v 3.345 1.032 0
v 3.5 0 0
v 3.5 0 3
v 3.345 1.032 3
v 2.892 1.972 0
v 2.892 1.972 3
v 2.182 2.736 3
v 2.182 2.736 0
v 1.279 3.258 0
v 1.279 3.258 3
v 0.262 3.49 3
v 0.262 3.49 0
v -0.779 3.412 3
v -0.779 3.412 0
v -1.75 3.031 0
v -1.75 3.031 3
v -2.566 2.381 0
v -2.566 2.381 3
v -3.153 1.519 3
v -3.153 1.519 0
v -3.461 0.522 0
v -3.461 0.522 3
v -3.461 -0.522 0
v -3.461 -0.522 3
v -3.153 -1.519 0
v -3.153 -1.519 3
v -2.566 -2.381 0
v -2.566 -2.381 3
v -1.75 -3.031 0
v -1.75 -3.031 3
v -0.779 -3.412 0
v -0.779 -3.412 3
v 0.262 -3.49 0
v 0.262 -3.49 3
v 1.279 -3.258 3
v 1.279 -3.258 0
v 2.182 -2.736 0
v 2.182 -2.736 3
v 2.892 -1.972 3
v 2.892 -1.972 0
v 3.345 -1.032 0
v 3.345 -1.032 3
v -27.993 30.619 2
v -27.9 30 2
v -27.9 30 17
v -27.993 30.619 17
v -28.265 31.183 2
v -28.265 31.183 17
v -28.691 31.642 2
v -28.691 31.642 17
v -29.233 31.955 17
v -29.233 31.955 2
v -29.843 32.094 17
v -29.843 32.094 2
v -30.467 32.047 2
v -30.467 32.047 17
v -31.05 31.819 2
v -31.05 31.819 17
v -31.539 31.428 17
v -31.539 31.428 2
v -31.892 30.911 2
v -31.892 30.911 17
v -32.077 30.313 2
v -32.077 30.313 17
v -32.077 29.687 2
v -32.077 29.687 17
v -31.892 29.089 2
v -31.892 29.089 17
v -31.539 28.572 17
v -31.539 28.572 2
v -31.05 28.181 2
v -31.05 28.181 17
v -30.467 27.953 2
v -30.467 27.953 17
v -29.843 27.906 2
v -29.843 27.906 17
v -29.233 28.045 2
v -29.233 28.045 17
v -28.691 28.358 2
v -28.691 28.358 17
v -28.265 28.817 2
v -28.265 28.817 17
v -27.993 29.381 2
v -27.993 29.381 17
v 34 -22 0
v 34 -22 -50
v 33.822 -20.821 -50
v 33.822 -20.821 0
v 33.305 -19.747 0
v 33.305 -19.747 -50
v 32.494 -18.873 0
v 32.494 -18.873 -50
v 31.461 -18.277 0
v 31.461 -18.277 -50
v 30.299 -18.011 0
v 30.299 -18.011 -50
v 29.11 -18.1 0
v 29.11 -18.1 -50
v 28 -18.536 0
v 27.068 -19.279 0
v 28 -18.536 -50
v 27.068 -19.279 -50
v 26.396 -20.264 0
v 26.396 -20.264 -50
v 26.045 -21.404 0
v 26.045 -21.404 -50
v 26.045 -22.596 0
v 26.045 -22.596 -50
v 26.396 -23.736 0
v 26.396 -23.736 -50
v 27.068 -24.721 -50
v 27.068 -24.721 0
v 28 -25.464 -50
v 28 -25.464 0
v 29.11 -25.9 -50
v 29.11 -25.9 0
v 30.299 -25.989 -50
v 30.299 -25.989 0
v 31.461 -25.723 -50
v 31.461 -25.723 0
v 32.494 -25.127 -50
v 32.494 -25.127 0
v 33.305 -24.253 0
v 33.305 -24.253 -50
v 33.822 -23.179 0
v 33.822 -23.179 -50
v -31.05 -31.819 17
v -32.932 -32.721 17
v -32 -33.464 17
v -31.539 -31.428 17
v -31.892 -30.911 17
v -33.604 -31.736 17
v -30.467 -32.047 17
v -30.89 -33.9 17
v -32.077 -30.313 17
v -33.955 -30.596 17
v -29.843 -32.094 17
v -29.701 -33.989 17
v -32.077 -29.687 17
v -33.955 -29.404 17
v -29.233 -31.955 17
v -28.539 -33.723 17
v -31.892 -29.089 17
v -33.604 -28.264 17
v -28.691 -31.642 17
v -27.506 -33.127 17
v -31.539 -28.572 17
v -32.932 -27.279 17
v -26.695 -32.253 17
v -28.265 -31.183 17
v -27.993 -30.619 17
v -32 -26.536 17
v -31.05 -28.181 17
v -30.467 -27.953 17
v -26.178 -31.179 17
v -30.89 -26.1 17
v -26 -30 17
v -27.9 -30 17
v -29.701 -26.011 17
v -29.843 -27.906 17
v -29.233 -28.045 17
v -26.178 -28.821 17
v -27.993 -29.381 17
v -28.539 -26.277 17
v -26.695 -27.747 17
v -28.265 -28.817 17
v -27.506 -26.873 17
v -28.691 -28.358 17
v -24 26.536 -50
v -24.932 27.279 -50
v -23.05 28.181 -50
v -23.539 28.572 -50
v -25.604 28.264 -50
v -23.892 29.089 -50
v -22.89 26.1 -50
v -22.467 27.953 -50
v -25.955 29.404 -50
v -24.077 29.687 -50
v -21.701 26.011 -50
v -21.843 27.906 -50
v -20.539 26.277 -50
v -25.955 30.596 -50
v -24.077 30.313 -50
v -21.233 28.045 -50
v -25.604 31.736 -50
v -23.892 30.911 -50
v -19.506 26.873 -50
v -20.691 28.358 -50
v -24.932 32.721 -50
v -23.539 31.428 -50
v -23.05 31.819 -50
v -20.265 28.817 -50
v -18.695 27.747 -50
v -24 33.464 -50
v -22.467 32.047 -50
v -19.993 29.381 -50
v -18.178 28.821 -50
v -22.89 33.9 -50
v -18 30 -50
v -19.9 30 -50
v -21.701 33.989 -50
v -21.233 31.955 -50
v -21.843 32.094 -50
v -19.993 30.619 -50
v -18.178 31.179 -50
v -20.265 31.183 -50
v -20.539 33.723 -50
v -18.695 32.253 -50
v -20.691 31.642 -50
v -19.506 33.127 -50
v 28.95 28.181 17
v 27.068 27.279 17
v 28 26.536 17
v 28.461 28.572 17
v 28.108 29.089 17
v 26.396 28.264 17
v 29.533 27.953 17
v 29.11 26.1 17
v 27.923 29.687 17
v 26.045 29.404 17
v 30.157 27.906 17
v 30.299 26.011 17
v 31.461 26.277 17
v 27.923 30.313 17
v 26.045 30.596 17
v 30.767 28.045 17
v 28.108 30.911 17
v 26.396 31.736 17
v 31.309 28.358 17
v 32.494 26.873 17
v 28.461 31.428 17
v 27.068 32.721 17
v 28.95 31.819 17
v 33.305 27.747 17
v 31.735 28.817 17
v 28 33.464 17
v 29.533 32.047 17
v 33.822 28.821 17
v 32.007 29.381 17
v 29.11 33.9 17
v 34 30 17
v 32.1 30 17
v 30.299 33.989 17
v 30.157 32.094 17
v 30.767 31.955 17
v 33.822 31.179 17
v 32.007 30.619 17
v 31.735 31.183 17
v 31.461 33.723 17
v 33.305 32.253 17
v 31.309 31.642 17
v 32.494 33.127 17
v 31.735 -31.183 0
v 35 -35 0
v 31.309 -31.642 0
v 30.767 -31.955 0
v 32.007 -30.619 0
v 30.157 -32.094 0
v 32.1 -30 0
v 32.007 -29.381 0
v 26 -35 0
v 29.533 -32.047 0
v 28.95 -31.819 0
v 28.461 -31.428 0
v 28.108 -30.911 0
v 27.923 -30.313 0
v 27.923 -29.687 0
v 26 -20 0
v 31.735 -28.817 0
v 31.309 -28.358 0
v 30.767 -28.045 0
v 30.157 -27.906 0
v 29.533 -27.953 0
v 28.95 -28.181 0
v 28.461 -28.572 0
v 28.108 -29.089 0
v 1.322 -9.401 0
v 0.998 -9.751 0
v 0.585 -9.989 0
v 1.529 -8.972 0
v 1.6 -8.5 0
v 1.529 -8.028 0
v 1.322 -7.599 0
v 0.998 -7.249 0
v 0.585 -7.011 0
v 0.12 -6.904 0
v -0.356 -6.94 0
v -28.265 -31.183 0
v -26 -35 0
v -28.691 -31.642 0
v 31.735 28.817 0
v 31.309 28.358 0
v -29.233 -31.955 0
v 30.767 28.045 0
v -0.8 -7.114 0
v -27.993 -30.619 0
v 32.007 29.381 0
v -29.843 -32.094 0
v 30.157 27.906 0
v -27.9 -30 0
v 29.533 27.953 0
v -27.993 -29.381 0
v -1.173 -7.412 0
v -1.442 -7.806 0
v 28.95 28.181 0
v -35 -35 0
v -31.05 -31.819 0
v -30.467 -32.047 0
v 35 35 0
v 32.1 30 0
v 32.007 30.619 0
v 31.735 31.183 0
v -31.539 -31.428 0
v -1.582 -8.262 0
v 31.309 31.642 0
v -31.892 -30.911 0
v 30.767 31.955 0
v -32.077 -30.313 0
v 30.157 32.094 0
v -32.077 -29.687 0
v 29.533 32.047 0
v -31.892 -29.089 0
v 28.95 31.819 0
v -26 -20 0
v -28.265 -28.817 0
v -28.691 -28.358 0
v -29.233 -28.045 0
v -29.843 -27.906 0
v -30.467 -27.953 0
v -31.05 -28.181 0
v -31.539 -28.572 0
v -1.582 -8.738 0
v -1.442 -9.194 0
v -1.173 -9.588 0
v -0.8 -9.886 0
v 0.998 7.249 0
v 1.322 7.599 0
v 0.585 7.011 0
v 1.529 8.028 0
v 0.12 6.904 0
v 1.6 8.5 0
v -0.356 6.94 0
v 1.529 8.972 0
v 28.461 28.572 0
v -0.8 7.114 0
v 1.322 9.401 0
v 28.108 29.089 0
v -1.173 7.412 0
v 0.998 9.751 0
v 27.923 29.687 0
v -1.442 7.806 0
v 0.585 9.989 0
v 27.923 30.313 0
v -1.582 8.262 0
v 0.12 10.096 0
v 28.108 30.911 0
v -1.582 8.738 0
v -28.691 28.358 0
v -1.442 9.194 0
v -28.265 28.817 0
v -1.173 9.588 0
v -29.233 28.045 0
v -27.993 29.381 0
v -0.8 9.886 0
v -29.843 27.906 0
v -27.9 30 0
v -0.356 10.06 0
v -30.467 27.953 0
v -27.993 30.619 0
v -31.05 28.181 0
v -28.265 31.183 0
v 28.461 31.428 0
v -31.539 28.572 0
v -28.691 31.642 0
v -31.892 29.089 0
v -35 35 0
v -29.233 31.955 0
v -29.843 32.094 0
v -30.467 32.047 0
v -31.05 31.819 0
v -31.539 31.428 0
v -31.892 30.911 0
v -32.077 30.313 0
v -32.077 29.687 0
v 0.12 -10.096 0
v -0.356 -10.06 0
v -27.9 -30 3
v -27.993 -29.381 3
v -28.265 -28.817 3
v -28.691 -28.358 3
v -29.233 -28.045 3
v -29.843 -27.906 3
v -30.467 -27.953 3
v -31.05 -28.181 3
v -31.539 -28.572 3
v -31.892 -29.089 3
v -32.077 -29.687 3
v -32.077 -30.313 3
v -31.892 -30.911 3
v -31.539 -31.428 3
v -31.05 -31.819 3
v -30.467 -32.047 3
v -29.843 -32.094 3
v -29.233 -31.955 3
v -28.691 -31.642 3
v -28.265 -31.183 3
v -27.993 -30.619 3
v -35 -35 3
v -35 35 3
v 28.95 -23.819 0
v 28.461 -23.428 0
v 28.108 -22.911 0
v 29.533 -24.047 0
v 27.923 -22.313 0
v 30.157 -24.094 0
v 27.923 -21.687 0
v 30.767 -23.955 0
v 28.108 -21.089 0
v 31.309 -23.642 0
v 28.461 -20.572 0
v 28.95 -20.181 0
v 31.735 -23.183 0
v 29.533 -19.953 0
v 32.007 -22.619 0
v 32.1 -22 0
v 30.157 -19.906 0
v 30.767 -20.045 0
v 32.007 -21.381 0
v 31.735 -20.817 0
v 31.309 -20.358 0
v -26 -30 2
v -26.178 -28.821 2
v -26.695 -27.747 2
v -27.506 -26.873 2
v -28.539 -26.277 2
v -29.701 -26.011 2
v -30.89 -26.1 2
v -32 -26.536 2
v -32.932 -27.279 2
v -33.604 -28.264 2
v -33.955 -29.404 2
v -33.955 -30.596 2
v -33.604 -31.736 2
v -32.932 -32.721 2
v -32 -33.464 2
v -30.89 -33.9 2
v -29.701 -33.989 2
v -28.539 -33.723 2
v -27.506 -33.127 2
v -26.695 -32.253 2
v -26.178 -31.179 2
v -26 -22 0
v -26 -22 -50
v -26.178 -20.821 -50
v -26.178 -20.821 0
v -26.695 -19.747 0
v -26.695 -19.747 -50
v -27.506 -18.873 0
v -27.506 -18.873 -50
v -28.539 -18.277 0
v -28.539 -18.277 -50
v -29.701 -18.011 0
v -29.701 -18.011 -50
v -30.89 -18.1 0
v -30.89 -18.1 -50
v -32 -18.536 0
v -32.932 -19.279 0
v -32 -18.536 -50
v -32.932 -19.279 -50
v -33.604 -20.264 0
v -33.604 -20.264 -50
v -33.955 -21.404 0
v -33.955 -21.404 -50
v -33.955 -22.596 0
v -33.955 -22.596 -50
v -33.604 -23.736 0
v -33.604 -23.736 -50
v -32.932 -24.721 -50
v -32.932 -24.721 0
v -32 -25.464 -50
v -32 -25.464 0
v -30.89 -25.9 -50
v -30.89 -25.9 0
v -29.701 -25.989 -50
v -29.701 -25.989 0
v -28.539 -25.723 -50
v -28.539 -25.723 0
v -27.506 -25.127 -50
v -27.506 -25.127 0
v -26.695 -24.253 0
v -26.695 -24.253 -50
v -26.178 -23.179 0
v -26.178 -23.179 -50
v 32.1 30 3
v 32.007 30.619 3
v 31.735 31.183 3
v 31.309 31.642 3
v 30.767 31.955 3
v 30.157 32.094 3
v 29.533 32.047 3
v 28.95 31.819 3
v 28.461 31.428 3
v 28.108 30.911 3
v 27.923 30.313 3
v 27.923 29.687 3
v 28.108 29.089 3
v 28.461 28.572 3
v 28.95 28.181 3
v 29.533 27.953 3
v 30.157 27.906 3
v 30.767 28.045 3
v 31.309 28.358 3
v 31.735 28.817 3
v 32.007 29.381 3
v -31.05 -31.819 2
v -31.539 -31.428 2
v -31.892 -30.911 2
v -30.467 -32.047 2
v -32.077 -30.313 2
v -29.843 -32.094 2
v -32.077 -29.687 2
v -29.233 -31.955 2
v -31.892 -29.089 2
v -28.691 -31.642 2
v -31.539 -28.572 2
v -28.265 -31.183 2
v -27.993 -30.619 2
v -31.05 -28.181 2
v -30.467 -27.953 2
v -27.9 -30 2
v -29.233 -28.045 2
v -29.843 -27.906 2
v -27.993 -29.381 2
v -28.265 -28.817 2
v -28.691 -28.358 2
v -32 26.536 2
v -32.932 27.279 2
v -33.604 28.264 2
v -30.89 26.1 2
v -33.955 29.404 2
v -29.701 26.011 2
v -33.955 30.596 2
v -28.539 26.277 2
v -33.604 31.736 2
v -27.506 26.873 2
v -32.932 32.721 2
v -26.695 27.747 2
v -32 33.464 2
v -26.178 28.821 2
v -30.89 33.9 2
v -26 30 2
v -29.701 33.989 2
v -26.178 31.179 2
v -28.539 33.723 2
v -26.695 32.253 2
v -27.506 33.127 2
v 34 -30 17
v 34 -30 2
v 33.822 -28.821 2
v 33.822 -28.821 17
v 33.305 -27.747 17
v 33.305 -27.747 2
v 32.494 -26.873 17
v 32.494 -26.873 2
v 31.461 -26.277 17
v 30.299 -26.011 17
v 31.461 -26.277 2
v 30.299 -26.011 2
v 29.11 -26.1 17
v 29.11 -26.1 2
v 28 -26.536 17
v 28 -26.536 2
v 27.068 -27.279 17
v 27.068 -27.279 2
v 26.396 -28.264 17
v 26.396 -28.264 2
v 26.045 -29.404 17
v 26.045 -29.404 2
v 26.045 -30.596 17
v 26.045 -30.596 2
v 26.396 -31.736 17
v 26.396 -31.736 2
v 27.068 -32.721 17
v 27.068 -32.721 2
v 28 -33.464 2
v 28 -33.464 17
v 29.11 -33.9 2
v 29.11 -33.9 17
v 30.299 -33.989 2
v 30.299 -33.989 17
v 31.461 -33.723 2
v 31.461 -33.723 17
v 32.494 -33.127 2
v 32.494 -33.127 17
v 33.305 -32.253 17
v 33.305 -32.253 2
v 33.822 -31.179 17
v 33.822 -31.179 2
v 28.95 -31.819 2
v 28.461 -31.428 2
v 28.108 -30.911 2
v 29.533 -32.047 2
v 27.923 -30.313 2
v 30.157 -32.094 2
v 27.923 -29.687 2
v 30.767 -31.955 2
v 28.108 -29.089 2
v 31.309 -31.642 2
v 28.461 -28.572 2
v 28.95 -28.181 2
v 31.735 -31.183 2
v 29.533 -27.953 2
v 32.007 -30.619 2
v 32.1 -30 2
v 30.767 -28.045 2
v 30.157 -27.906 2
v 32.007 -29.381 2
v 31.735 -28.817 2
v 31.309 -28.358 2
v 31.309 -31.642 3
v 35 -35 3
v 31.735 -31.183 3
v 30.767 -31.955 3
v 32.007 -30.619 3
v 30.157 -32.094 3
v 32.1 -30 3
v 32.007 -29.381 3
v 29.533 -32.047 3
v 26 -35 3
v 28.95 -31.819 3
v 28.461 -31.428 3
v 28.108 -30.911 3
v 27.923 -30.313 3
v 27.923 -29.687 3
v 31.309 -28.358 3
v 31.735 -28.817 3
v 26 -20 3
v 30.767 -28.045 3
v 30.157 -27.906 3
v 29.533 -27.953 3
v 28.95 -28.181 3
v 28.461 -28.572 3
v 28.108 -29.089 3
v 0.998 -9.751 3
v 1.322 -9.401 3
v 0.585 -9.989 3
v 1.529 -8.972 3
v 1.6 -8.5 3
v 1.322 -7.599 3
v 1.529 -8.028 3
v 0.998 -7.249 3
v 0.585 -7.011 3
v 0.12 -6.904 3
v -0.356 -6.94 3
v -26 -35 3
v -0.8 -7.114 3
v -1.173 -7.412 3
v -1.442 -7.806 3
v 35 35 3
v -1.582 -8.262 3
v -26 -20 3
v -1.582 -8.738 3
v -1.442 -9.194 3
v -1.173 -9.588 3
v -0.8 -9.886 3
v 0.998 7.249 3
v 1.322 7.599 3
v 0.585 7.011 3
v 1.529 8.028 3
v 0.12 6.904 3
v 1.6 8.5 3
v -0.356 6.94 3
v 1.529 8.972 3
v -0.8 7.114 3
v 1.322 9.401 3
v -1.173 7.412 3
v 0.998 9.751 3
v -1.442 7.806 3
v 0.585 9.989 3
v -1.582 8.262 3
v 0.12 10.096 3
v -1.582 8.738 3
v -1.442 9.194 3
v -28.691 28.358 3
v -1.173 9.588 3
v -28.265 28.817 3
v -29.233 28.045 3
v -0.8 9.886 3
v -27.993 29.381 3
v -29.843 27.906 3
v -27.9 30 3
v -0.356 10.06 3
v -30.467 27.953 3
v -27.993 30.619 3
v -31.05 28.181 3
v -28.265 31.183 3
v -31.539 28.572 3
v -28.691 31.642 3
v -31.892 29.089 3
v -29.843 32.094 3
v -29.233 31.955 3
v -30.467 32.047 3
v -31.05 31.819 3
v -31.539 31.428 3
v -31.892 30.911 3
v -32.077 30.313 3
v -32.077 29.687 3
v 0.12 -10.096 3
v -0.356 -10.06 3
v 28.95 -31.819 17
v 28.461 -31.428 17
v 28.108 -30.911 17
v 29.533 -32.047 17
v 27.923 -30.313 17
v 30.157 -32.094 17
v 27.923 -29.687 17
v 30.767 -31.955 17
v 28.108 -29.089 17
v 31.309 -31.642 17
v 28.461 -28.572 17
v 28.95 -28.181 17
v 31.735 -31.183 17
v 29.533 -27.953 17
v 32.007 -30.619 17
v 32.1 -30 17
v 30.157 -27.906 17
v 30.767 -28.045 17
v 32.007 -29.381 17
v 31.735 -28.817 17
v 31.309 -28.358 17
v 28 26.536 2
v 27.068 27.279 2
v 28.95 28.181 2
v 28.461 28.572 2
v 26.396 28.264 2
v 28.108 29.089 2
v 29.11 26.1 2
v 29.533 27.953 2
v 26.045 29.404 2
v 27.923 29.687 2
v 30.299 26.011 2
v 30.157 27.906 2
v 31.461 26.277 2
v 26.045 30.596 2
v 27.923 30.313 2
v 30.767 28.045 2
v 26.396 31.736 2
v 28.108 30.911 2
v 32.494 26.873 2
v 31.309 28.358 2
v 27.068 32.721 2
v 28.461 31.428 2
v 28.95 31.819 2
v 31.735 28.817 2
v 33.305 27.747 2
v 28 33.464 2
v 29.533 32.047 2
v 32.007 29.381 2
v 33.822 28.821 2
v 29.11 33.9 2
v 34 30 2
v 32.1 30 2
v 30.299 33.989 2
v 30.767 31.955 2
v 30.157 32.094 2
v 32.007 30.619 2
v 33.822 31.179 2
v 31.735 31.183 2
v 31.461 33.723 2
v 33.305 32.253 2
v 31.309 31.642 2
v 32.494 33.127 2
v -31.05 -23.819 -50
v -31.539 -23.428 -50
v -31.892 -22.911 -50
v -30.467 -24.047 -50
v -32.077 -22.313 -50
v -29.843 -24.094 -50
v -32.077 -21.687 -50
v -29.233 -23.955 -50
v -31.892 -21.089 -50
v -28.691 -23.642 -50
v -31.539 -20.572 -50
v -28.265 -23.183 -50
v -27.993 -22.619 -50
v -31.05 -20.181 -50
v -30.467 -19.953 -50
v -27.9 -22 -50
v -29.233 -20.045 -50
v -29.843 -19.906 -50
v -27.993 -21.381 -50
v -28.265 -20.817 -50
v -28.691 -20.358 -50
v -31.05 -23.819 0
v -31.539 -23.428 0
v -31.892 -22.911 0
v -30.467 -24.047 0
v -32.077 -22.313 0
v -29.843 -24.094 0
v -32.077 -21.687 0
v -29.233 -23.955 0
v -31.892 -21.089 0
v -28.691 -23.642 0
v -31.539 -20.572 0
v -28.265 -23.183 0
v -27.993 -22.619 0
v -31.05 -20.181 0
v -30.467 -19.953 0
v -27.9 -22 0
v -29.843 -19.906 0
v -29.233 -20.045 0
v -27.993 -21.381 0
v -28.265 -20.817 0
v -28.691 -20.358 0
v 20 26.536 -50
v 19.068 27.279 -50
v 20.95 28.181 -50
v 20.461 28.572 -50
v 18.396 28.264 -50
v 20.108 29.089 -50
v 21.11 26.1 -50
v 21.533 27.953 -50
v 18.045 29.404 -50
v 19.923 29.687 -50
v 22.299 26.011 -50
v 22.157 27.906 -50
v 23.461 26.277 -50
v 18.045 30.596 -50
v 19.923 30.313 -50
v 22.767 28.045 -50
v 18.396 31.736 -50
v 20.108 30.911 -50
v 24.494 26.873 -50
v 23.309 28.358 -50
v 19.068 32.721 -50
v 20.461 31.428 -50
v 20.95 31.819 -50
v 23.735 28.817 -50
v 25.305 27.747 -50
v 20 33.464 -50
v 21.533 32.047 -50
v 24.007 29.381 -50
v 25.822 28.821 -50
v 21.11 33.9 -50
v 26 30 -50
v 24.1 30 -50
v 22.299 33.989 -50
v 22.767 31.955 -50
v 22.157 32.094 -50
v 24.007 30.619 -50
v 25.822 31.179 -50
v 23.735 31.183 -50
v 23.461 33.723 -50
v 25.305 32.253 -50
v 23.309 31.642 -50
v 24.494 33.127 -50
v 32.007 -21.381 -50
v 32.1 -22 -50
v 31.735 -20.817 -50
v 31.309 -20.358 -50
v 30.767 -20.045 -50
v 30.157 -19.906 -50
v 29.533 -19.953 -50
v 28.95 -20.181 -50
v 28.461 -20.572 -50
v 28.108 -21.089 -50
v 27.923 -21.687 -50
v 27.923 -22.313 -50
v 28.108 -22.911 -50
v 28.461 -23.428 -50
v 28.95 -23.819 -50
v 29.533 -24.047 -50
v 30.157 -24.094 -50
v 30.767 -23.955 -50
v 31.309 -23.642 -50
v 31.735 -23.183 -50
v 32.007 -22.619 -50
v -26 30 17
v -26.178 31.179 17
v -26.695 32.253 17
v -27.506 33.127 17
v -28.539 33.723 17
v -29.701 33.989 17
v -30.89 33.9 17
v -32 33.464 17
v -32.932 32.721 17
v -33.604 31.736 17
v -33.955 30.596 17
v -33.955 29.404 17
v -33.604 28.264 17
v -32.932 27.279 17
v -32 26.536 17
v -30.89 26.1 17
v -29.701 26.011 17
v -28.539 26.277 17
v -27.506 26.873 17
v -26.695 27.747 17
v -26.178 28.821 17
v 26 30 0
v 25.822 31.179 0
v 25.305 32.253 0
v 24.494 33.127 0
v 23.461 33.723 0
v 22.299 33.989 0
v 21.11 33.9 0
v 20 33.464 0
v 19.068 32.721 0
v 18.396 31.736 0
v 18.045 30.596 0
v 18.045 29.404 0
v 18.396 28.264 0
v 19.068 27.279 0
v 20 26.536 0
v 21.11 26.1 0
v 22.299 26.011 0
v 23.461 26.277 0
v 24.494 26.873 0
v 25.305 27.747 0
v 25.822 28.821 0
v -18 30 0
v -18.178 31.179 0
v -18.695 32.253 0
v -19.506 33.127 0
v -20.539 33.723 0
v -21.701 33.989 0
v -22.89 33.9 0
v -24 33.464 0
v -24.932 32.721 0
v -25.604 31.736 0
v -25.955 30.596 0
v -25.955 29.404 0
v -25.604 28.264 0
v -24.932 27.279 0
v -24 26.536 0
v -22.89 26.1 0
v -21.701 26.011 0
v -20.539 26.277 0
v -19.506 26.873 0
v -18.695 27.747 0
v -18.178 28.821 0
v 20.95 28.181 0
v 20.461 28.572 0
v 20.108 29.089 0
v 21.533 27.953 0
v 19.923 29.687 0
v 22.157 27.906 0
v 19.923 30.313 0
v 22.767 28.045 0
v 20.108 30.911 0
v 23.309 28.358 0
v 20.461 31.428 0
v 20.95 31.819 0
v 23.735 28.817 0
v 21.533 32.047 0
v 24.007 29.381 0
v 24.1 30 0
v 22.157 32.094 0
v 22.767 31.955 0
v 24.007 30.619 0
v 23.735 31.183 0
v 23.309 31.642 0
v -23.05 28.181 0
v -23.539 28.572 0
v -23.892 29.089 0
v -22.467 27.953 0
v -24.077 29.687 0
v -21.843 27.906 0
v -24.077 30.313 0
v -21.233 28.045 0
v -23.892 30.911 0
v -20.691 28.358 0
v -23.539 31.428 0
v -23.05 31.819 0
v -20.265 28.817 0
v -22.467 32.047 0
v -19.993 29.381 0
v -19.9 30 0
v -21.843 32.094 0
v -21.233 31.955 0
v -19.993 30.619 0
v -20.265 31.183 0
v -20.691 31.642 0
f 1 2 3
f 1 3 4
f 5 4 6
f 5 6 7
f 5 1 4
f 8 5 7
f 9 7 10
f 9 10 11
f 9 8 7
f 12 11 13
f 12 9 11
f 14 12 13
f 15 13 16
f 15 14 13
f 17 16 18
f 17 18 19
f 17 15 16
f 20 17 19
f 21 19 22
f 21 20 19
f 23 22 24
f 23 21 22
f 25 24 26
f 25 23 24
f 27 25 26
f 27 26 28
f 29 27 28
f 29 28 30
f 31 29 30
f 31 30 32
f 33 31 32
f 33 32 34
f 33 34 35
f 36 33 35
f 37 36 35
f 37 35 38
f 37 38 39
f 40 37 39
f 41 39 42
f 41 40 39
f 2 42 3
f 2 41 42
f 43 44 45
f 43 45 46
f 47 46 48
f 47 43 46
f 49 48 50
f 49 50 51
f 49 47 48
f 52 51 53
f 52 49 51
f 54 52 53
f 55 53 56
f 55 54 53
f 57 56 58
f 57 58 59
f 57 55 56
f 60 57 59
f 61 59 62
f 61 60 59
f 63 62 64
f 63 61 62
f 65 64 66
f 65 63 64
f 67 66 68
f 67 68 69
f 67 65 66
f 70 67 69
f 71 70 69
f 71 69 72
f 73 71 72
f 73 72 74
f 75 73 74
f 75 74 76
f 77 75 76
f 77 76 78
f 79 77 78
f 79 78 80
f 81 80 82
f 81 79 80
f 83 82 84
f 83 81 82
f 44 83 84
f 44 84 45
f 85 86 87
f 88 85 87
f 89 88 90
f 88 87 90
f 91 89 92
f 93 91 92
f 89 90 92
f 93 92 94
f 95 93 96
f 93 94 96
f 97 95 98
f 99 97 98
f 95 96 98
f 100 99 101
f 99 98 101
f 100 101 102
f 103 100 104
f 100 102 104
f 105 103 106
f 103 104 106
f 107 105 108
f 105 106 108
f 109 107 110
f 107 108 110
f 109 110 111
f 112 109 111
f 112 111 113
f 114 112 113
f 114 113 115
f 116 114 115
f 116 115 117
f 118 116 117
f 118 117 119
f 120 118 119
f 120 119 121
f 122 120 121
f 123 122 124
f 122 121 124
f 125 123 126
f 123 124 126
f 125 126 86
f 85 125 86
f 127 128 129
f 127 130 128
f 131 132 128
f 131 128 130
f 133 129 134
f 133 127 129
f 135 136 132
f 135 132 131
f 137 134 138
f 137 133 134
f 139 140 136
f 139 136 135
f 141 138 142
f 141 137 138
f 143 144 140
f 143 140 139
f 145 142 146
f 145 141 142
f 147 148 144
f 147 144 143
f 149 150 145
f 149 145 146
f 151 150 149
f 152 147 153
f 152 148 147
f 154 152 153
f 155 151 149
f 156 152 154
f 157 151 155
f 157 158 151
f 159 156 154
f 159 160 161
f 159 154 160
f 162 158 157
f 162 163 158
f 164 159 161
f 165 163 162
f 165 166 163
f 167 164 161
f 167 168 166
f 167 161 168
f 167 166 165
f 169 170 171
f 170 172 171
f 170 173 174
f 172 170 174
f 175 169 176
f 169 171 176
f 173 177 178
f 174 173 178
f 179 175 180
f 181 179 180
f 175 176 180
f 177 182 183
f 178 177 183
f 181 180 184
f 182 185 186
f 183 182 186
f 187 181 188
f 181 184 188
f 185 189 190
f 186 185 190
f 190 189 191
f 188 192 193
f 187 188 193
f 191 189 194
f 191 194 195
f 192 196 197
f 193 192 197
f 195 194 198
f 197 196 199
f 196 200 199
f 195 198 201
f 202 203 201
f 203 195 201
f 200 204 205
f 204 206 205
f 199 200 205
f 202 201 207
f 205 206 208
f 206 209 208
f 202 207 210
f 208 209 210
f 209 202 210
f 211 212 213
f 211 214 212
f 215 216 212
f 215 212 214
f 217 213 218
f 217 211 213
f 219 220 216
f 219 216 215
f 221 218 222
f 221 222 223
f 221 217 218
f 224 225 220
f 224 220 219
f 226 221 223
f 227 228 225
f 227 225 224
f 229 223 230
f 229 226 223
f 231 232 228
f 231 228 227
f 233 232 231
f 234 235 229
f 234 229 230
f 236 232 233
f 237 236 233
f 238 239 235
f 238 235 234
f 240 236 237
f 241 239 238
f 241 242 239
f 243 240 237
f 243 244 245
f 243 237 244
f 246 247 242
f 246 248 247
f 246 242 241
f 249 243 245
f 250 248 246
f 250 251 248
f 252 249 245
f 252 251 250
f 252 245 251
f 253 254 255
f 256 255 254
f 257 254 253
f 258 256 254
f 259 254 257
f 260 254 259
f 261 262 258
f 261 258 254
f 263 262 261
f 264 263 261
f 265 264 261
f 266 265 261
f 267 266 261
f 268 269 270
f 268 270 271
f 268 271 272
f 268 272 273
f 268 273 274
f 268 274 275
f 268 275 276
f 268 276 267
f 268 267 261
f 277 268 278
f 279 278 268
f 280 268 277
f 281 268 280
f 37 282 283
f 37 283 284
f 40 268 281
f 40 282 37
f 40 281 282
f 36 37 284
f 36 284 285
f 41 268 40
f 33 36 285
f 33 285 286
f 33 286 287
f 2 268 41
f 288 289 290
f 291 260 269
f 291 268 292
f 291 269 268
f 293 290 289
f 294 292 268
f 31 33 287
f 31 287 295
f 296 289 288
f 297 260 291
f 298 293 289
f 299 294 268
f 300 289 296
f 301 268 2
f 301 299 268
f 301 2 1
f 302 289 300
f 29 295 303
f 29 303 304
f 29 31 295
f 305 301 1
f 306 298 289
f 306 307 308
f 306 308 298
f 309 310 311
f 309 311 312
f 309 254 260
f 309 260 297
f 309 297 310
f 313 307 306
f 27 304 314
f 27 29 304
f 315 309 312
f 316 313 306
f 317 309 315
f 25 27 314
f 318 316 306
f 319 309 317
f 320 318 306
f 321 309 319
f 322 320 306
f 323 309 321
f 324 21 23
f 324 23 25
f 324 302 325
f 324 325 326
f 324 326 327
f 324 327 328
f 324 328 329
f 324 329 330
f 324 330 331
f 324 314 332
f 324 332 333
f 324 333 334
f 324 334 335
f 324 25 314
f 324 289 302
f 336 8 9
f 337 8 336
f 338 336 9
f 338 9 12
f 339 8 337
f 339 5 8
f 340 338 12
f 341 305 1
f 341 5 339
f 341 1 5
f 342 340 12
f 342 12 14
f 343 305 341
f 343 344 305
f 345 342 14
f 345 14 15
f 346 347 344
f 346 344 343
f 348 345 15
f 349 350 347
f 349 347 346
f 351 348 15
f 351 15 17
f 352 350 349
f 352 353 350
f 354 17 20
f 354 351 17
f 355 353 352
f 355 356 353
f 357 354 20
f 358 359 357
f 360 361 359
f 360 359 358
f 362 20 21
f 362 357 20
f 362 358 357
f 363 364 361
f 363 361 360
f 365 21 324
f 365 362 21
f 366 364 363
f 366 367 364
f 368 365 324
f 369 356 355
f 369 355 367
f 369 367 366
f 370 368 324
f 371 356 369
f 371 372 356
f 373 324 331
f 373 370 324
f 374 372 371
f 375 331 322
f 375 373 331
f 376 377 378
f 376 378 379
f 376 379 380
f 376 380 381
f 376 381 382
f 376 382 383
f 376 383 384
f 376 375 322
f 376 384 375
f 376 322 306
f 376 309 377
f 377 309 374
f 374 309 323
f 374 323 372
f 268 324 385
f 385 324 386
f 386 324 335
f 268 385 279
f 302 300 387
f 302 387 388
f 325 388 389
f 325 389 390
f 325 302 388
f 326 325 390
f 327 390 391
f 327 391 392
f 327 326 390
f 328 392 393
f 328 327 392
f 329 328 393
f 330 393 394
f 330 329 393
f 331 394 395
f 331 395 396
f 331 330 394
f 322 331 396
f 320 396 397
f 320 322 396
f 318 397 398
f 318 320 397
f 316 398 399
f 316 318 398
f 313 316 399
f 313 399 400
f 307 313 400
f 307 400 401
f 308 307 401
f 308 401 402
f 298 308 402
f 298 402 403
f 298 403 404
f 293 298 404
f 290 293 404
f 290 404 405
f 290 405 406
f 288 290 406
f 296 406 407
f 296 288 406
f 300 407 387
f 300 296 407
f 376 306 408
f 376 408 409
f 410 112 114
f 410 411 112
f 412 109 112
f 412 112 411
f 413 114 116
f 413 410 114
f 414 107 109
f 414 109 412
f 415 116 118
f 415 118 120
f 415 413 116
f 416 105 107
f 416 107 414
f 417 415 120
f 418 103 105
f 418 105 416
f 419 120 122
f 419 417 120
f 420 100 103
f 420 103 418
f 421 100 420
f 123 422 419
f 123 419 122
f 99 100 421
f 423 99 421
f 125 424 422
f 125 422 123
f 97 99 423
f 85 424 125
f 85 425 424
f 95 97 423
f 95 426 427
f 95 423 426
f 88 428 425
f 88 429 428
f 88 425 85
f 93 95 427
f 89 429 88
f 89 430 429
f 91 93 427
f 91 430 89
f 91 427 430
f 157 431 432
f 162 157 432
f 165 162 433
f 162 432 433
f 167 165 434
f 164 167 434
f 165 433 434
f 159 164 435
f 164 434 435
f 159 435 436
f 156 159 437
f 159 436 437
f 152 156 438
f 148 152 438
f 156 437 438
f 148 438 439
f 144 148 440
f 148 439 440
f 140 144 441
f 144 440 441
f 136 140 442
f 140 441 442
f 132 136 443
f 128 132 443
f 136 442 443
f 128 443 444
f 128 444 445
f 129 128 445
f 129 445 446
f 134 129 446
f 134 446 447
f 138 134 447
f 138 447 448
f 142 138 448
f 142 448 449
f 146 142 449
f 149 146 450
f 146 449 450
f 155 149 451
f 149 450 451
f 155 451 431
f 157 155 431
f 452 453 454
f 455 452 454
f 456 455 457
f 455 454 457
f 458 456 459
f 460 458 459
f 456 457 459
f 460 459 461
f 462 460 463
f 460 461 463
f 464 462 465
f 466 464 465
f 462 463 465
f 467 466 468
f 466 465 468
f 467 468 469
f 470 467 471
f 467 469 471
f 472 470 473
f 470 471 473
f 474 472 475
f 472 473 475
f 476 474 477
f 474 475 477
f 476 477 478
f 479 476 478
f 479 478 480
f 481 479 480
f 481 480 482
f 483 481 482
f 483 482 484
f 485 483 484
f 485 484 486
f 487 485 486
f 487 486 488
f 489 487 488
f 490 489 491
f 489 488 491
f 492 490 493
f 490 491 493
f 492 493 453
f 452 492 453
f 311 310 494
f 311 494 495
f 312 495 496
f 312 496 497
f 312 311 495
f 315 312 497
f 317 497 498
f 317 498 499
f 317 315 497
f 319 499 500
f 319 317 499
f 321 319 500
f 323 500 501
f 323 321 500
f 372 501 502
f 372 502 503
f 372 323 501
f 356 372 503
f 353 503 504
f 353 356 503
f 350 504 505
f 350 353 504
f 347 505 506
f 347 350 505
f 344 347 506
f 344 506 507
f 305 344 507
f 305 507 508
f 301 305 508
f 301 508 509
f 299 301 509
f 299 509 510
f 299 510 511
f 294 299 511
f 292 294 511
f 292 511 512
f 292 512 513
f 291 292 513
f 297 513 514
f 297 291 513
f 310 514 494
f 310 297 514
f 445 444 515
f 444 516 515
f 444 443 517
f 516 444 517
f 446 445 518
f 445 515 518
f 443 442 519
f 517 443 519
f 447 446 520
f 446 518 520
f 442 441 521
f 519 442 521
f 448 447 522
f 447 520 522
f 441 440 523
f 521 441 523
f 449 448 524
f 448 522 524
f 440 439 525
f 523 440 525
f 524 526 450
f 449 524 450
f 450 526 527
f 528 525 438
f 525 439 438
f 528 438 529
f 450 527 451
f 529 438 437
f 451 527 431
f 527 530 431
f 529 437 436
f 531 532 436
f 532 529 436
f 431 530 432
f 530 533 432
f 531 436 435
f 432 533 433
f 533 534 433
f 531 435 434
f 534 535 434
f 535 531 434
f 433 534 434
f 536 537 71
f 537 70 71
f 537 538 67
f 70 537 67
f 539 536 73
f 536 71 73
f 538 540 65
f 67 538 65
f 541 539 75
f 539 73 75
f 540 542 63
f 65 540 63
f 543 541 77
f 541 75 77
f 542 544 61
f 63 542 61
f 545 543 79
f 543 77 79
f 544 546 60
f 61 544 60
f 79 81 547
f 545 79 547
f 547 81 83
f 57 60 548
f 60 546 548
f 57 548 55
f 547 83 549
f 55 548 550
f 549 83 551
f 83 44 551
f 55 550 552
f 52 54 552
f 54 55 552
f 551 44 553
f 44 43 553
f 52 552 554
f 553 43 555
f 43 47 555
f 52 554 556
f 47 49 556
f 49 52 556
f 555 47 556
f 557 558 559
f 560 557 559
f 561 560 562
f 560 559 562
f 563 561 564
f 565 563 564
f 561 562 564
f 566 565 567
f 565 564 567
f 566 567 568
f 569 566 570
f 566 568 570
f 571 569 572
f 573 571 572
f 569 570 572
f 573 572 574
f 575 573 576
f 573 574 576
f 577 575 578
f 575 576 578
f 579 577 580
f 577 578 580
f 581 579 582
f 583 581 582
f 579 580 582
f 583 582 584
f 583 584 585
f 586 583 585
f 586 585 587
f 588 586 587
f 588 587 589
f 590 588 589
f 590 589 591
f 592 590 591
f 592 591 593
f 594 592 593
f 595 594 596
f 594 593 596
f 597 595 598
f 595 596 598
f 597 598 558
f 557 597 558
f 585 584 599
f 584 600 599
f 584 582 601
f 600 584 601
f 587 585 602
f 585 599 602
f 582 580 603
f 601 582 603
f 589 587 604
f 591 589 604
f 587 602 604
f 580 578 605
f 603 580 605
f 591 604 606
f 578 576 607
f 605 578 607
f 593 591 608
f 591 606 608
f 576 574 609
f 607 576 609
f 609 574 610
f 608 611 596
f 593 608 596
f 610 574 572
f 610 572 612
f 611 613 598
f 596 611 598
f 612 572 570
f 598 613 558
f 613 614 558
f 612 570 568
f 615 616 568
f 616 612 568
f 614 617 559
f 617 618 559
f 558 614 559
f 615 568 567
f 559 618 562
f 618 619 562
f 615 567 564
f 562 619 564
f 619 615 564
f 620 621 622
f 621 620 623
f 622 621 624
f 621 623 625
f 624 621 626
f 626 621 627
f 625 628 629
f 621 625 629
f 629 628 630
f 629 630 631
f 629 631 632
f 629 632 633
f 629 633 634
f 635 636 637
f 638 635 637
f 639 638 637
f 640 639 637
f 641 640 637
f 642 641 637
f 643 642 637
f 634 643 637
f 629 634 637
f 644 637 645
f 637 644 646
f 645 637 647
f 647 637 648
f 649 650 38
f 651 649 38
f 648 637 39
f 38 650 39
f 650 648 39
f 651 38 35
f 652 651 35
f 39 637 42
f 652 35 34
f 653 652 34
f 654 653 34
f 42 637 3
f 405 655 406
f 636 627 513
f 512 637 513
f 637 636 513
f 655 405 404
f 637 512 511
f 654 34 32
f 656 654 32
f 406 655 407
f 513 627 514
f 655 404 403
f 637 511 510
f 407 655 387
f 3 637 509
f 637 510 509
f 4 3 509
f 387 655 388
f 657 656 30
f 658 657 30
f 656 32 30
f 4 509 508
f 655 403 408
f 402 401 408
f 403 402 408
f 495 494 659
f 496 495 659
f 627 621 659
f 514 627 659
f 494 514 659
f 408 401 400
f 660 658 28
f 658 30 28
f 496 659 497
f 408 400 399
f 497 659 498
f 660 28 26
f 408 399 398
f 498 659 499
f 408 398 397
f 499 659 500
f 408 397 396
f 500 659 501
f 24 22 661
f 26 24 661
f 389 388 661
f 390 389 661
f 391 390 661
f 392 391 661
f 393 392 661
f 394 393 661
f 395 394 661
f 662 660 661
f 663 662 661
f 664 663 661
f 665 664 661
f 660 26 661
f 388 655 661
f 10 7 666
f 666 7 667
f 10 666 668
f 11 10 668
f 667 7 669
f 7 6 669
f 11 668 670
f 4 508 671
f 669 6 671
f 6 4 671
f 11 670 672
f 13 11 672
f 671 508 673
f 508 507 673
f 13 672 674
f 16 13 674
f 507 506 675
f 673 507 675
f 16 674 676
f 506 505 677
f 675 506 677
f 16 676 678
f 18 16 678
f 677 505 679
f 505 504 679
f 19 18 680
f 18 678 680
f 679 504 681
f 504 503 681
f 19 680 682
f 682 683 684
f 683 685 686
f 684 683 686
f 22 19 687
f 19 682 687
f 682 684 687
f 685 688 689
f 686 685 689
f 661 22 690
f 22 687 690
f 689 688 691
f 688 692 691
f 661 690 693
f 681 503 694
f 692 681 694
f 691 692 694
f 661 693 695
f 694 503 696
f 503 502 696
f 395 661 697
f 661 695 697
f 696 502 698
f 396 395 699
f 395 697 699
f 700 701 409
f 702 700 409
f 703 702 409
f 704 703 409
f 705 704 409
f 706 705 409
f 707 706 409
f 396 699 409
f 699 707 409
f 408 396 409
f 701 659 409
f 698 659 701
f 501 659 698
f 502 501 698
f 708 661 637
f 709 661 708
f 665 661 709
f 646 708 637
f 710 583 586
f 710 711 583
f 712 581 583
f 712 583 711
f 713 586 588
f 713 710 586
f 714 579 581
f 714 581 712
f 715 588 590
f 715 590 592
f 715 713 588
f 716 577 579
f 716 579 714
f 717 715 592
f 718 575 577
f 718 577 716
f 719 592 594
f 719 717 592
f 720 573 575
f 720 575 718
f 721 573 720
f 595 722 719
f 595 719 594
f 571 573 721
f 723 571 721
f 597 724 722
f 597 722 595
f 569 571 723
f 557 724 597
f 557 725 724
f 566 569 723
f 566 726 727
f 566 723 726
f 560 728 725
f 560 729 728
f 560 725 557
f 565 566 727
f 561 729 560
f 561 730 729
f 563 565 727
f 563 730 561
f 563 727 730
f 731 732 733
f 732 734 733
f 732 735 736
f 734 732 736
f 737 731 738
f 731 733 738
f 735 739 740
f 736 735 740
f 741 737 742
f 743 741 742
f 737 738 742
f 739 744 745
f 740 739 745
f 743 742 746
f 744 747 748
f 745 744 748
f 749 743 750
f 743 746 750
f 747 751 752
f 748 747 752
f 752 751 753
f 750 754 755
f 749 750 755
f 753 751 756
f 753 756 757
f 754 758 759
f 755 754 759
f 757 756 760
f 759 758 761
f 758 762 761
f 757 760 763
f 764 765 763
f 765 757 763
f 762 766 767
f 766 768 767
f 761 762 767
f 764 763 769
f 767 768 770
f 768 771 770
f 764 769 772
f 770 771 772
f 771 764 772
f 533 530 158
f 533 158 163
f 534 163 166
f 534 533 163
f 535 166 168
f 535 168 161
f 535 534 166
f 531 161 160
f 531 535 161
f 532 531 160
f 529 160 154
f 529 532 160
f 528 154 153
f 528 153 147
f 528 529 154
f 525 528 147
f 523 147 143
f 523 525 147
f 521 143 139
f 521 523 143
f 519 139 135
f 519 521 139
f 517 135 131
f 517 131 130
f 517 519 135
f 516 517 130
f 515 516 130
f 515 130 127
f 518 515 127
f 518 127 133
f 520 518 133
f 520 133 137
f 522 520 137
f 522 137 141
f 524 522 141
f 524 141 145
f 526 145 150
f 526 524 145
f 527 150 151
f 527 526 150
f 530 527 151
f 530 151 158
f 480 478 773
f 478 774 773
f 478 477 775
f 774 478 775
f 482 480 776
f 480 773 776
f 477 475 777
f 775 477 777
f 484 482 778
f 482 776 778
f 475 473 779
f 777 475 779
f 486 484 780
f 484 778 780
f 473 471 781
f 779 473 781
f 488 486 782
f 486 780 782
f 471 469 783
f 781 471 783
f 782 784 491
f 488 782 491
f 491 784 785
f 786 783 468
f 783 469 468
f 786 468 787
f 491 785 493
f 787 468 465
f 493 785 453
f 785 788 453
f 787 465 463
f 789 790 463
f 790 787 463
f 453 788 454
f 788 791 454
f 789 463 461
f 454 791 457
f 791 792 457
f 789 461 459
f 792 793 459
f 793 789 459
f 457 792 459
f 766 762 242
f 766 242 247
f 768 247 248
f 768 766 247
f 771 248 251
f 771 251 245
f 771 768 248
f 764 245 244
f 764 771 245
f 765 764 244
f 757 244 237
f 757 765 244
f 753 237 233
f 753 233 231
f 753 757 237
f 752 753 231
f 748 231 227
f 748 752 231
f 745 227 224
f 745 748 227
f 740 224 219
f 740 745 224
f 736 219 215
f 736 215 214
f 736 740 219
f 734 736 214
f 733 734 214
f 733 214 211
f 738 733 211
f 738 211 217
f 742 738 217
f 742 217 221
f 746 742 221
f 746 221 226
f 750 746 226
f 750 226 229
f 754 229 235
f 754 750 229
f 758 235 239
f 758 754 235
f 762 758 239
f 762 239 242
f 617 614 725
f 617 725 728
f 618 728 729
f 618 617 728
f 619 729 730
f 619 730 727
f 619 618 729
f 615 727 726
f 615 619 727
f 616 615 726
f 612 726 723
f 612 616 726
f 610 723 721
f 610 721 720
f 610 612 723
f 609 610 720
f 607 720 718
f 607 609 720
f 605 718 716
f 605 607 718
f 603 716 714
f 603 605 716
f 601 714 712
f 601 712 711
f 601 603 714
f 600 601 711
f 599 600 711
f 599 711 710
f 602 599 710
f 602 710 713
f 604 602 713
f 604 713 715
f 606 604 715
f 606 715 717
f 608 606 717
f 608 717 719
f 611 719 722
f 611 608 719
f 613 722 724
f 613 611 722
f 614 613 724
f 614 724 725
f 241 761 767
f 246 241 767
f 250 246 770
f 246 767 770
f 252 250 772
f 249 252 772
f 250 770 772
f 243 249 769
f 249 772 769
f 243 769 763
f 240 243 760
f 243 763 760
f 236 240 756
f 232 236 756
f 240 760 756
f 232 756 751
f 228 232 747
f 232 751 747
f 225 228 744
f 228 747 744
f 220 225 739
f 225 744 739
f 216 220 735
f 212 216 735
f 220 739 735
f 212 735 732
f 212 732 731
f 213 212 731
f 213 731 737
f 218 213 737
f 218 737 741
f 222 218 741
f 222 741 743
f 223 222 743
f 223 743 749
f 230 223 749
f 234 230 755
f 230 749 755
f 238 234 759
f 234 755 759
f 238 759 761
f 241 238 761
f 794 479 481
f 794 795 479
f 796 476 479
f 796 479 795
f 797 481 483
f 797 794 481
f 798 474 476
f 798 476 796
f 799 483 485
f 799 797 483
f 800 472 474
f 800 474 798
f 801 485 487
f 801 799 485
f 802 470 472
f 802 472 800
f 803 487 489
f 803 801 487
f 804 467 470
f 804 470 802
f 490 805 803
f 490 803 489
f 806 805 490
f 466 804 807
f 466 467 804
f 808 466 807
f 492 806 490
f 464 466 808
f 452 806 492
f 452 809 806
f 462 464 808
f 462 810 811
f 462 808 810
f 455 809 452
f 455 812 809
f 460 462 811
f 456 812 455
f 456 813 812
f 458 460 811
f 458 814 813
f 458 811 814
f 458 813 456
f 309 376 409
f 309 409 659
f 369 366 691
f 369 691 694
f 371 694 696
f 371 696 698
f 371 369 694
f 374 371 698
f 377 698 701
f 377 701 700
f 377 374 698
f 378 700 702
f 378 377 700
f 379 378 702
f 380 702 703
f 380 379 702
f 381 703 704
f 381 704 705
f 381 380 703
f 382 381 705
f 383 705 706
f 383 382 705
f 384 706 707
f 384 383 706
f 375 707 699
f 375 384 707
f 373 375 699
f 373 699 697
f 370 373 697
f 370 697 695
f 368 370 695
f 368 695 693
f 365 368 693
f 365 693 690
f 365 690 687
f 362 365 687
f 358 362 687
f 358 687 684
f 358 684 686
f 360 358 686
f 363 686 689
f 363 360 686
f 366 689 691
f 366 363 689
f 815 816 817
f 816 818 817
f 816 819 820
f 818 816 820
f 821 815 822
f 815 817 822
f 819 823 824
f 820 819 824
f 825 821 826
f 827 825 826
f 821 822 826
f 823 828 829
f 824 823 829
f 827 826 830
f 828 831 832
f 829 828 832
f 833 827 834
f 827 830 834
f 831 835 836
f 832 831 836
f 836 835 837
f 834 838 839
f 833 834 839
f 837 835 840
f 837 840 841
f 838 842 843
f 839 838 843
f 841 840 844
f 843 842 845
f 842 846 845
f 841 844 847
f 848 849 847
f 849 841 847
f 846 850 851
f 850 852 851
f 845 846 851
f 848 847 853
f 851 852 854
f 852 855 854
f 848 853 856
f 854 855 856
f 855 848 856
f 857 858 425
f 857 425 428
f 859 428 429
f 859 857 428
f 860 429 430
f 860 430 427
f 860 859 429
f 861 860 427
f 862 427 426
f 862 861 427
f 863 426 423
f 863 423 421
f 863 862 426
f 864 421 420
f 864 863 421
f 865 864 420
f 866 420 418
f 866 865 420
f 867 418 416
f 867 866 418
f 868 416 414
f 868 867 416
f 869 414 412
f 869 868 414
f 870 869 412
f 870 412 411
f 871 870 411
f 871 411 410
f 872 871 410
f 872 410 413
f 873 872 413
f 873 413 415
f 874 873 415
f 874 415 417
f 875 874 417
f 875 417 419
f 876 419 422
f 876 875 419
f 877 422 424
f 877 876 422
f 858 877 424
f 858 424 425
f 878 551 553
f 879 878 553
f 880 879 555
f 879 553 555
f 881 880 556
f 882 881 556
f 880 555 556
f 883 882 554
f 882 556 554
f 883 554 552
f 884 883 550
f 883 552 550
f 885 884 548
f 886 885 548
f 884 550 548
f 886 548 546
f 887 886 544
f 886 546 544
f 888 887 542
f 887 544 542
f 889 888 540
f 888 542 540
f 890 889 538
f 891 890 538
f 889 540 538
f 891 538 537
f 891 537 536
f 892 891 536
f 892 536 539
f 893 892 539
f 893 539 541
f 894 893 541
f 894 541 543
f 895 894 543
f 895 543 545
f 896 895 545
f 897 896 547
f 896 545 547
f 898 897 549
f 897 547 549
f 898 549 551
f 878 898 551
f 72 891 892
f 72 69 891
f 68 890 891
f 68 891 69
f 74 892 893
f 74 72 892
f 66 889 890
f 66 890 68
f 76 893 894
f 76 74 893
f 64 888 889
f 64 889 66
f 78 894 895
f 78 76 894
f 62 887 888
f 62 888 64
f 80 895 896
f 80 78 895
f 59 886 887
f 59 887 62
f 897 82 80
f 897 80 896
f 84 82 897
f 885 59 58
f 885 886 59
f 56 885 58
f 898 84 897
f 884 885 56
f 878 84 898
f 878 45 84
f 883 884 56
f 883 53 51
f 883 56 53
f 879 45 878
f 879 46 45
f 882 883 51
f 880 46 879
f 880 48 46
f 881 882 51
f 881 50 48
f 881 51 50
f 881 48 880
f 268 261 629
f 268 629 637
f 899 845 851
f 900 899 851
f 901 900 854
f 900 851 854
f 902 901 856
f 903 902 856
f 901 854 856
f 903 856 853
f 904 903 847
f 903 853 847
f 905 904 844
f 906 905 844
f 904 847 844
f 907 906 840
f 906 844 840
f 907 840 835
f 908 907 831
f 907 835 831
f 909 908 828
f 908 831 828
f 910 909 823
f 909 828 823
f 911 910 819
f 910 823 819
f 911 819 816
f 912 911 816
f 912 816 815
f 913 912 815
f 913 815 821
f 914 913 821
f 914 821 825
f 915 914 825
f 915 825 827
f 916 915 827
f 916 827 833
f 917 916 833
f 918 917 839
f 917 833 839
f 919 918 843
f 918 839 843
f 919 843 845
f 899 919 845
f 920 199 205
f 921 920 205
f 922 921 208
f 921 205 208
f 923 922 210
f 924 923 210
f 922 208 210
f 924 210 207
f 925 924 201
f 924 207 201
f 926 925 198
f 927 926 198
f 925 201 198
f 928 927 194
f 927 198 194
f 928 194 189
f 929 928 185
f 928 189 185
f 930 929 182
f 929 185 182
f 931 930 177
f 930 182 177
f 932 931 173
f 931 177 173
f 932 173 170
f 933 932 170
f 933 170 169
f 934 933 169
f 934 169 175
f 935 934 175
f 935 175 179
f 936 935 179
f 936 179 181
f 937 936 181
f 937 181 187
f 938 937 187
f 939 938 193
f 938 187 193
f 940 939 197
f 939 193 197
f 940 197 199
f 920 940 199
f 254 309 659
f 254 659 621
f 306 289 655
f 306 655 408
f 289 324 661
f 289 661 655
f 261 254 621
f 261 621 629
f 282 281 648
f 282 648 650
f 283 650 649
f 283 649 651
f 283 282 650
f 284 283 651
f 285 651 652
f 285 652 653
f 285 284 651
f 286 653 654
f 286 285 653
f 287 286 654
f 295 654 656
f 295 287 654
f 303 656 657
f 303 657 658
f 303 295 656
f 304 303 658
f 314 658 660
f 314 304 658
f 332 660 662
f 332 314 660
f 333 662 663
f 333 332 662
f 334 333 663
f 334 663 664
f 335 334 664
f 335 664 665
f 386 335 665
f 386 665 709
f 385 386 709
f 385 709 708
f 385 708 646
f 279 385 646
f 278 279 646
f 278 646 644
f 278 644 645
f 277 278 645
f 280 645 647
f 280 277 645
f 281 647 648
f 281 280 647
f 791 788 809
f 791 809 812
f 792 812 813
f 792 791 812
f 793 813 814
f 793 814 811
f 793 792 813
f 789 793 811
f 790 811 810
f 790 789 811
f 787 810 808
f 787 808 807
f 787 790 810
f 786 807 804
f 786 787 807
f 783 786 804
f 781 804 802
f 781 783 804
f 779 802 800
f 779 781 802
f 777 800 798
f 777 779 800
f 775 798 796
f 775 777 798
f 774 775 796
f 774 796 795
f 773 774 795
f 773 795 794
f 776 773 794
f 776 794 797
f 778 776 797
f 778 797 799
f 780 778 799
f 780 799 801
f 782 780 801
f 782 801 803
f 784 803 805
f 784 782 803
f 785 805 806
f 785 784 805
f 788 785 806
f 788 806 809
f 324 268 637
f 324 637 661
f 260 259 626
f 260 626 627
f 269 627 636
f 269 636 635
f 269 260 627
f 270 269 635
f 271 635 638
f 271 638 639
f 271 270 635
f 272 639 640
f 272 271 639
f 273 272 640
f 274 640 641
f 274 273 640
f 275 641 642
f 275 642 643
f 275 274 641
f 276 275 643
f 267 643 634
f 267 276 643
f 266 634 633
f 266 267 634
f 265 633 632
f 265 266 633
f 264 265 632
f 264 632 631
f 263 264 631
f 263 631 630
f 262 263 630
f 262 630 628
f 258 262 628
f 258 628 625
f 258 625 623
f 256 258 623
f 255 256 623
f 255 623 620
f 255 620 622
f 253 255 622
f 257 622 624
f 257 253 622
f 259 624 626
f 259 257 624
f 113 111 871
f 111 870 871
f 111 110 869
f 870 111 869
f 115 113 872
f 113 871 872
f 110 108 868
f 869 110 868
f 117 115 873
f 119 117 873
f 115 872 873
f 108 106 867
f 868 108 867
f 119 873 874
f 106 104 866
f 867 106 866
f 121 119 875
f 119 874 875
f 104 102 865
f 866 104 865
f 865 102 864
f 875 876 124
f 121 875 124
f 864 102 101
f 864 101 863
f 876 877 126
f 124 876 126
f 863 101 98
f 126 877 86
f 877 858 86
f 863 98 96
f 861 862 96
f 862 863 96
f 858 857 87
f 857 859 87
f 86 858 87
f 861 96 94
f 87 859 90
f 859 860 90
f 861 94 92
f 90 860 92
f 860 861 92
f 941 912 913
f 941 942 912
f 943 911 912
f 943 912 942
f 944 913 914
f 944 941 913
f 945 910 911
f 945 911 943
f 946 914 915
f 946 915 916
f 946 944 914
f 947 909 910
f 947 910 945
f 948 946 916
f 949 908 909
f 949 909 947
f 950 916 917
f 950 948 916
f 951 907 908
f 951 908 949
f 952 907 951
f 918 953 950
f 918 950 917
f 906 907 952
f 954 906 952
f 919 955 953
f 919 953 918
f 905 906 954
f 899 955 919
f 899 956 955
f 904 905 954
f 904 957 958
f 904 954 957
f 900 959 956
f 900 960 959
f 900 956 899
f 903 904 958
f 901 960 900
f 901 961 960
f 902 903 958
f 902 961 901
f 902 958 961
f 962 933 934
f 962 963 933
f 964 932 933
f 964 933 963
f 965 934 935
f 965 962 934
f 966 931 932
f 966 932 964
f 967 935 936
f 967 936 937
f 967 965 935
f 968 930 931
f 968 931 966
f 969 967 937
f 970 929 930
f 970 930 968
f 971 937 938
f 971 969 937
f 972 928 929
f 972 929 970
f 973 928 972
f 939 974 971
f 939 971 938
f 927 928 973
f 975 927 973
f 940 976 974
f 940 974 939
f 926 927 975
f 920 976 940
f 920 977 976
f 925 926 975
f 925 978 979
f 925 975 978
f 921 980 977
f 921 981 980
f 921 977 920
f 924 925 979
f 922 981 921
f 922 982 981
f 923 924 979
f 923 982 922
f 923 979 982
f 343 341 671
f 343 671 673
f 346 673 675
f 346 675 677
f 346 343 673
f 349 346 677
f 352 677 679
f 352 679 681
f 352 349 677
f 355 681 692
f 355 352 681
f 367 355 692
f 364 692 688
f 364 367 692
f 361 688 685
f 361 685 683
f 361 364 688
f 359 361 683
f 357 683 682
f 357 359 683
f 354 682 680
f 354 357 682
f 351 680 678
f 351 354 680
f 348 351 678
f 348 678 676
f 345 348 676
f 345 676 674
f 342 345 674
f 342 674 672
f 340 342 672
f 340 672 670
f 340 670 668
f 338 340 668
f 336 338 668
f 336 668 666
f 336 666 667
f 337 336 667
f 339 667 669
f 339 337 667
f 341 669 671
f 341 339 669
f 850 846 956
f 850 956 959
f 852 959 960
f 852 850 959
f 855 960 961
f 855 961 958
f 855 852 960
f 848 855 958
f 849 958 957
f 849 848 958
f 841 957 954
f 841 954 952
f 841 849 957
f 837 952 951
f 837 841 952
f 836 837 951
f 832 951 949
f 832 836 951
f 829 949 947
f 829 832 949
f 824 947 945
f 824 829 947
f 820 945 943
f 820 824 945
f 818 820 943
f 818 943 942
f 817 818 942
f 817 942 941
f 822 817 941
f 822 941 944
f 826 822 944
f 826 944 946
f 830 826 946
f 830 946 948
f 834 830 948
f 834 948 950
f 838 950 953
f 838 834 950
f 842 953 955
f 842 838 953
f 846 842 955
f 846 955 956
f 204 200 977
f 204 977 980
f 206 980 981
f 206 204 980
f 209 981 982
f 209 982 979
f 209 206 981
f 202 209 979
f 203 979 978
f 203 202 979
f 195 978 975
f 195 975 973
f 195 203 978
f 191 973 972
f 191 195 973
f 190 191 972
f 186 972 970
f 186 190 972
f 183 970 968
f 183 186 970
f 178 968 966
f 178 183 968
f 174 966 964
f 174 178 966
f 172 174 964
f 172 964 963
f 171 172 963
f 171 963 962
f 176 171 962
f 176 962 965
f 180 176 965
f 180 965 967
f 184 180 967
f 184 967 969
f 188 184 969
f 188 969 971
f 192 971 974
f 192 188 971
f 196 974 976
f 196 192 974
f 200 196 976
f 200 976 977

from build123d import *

# Parameters (mm, degrees)
SKETCH002_R   = 3.5
SKETCH002_R_2 = 1.6
SKETCH002_R_3 = 2.1
PAD_DEPTH     = 3
SKETCH003_R   = 4
SKETCH003_R_2 = 2.1
PAD001_DEPTH  = 15
SKETCH004_R   = 4
SKETCH004_R_2 = 2.1
PAD002_DEPTH  = 50


with BuildPart() as pad:
    # Sketch002 → Pad (new body)
    with BuildSketch(Plane.XY):
        Polygon((-35, 35), (35, 35), (35, -35), (26, -35), (26, -20), (-26, -20), (-26, -35), (-35, -35), align=None)
        Circle(SKETCH002_R, mode=Mode.SUBTRACT)
        with Locations((0, 8.5)):
            Circle(SKETCH002_R_2, mode=Mode.SUBTRACT)
        with Locations((0, -8.5)):
            Circle(SKETCH002_R_2, mode=Mode.SUBTRACT)
        with Locations((30, 30)):
            Circle(SKETCH002_R_3, mode=Mode.SUBTRACT)
        with Locations((-30, 30)):
            Circle(SKETCH002_R_3, mode=Mode.SUBTRACT)
        with Locations((-30, -30)):
            Circle(SKETCH002_R_3, mode=Mode.SUBTRACT)
        with Locations((30, -30)):
            Circle(SKETCH002_R_3, mode=Mode.SUBTRACT)
    extrude(amount=PAD_DEPTH)


with BuildPart() as pad001:
    # Sketch003 → Pad001 (new body)
    with BuildSketch(Plane.XY.offset(2)):
        with Locations((-30, 30)):
            Circle(SKETCH003_R)
        with Locations((-30, 30)):
            Circle(SKETCH003_R_2, mode=Mode.SUBTRACT)
        with Locations((30, 30)):
            Circle(SKETCH003_R)
        with Locations((30, 30)):
            Circle(SKETCH003_R_2, mode=Mode.SUBTRACT)
        with Locations((30, -30)):
            Circle(SKETCH003_R)
        with Locations((30, -30)):
            Circle(SKETCH003_R_2, mode=Mode.SUBTRACT)
        with Locations((-30, -30)):
            Circle(SKETCH003_R)
        with Locations((-30, -30)):
            Circle(SKETCH003_R_2, mode=Mode.SUBTRACT)
    extrude(amount=PAD001_DEPTH)


with BuildPart() as pad002:
    # Sketch004 → Pad002 (new body)
    with BuildSketch(Plane.XY.offset(-50)):
        with Locations((-22, 30)):
            Circle(SKETCH004_R)
        with Locations((-22, 30)):
            Circle(SKETCH004_R_2, mode=Mode.SUBTRACT)
        with Locations((22, 30)):
            Circle(SKETCH004_R)
        with Locations((22, 30)):
            Circle(SKETCH004_R_2, mode=Mode.SUBTRACT)
        with Locations((30, -22)):
            Circle(SKETCH004_R)
        with Locations((30, -22)):
            Circle(SKETCH004_R_2, mode=Mode.SUBTRACT)
        with Locations((-30, -22)):
            Circle(SKETCH004_R)
        with Locations((-30, -22)):
            Circle(SKETCH004_R_2, mode=Mode.SUBTRACT)
    extrude(amount=PAD002_DEPTH)


solid = Compound([pad.part, pad001.part, pad002.part])
